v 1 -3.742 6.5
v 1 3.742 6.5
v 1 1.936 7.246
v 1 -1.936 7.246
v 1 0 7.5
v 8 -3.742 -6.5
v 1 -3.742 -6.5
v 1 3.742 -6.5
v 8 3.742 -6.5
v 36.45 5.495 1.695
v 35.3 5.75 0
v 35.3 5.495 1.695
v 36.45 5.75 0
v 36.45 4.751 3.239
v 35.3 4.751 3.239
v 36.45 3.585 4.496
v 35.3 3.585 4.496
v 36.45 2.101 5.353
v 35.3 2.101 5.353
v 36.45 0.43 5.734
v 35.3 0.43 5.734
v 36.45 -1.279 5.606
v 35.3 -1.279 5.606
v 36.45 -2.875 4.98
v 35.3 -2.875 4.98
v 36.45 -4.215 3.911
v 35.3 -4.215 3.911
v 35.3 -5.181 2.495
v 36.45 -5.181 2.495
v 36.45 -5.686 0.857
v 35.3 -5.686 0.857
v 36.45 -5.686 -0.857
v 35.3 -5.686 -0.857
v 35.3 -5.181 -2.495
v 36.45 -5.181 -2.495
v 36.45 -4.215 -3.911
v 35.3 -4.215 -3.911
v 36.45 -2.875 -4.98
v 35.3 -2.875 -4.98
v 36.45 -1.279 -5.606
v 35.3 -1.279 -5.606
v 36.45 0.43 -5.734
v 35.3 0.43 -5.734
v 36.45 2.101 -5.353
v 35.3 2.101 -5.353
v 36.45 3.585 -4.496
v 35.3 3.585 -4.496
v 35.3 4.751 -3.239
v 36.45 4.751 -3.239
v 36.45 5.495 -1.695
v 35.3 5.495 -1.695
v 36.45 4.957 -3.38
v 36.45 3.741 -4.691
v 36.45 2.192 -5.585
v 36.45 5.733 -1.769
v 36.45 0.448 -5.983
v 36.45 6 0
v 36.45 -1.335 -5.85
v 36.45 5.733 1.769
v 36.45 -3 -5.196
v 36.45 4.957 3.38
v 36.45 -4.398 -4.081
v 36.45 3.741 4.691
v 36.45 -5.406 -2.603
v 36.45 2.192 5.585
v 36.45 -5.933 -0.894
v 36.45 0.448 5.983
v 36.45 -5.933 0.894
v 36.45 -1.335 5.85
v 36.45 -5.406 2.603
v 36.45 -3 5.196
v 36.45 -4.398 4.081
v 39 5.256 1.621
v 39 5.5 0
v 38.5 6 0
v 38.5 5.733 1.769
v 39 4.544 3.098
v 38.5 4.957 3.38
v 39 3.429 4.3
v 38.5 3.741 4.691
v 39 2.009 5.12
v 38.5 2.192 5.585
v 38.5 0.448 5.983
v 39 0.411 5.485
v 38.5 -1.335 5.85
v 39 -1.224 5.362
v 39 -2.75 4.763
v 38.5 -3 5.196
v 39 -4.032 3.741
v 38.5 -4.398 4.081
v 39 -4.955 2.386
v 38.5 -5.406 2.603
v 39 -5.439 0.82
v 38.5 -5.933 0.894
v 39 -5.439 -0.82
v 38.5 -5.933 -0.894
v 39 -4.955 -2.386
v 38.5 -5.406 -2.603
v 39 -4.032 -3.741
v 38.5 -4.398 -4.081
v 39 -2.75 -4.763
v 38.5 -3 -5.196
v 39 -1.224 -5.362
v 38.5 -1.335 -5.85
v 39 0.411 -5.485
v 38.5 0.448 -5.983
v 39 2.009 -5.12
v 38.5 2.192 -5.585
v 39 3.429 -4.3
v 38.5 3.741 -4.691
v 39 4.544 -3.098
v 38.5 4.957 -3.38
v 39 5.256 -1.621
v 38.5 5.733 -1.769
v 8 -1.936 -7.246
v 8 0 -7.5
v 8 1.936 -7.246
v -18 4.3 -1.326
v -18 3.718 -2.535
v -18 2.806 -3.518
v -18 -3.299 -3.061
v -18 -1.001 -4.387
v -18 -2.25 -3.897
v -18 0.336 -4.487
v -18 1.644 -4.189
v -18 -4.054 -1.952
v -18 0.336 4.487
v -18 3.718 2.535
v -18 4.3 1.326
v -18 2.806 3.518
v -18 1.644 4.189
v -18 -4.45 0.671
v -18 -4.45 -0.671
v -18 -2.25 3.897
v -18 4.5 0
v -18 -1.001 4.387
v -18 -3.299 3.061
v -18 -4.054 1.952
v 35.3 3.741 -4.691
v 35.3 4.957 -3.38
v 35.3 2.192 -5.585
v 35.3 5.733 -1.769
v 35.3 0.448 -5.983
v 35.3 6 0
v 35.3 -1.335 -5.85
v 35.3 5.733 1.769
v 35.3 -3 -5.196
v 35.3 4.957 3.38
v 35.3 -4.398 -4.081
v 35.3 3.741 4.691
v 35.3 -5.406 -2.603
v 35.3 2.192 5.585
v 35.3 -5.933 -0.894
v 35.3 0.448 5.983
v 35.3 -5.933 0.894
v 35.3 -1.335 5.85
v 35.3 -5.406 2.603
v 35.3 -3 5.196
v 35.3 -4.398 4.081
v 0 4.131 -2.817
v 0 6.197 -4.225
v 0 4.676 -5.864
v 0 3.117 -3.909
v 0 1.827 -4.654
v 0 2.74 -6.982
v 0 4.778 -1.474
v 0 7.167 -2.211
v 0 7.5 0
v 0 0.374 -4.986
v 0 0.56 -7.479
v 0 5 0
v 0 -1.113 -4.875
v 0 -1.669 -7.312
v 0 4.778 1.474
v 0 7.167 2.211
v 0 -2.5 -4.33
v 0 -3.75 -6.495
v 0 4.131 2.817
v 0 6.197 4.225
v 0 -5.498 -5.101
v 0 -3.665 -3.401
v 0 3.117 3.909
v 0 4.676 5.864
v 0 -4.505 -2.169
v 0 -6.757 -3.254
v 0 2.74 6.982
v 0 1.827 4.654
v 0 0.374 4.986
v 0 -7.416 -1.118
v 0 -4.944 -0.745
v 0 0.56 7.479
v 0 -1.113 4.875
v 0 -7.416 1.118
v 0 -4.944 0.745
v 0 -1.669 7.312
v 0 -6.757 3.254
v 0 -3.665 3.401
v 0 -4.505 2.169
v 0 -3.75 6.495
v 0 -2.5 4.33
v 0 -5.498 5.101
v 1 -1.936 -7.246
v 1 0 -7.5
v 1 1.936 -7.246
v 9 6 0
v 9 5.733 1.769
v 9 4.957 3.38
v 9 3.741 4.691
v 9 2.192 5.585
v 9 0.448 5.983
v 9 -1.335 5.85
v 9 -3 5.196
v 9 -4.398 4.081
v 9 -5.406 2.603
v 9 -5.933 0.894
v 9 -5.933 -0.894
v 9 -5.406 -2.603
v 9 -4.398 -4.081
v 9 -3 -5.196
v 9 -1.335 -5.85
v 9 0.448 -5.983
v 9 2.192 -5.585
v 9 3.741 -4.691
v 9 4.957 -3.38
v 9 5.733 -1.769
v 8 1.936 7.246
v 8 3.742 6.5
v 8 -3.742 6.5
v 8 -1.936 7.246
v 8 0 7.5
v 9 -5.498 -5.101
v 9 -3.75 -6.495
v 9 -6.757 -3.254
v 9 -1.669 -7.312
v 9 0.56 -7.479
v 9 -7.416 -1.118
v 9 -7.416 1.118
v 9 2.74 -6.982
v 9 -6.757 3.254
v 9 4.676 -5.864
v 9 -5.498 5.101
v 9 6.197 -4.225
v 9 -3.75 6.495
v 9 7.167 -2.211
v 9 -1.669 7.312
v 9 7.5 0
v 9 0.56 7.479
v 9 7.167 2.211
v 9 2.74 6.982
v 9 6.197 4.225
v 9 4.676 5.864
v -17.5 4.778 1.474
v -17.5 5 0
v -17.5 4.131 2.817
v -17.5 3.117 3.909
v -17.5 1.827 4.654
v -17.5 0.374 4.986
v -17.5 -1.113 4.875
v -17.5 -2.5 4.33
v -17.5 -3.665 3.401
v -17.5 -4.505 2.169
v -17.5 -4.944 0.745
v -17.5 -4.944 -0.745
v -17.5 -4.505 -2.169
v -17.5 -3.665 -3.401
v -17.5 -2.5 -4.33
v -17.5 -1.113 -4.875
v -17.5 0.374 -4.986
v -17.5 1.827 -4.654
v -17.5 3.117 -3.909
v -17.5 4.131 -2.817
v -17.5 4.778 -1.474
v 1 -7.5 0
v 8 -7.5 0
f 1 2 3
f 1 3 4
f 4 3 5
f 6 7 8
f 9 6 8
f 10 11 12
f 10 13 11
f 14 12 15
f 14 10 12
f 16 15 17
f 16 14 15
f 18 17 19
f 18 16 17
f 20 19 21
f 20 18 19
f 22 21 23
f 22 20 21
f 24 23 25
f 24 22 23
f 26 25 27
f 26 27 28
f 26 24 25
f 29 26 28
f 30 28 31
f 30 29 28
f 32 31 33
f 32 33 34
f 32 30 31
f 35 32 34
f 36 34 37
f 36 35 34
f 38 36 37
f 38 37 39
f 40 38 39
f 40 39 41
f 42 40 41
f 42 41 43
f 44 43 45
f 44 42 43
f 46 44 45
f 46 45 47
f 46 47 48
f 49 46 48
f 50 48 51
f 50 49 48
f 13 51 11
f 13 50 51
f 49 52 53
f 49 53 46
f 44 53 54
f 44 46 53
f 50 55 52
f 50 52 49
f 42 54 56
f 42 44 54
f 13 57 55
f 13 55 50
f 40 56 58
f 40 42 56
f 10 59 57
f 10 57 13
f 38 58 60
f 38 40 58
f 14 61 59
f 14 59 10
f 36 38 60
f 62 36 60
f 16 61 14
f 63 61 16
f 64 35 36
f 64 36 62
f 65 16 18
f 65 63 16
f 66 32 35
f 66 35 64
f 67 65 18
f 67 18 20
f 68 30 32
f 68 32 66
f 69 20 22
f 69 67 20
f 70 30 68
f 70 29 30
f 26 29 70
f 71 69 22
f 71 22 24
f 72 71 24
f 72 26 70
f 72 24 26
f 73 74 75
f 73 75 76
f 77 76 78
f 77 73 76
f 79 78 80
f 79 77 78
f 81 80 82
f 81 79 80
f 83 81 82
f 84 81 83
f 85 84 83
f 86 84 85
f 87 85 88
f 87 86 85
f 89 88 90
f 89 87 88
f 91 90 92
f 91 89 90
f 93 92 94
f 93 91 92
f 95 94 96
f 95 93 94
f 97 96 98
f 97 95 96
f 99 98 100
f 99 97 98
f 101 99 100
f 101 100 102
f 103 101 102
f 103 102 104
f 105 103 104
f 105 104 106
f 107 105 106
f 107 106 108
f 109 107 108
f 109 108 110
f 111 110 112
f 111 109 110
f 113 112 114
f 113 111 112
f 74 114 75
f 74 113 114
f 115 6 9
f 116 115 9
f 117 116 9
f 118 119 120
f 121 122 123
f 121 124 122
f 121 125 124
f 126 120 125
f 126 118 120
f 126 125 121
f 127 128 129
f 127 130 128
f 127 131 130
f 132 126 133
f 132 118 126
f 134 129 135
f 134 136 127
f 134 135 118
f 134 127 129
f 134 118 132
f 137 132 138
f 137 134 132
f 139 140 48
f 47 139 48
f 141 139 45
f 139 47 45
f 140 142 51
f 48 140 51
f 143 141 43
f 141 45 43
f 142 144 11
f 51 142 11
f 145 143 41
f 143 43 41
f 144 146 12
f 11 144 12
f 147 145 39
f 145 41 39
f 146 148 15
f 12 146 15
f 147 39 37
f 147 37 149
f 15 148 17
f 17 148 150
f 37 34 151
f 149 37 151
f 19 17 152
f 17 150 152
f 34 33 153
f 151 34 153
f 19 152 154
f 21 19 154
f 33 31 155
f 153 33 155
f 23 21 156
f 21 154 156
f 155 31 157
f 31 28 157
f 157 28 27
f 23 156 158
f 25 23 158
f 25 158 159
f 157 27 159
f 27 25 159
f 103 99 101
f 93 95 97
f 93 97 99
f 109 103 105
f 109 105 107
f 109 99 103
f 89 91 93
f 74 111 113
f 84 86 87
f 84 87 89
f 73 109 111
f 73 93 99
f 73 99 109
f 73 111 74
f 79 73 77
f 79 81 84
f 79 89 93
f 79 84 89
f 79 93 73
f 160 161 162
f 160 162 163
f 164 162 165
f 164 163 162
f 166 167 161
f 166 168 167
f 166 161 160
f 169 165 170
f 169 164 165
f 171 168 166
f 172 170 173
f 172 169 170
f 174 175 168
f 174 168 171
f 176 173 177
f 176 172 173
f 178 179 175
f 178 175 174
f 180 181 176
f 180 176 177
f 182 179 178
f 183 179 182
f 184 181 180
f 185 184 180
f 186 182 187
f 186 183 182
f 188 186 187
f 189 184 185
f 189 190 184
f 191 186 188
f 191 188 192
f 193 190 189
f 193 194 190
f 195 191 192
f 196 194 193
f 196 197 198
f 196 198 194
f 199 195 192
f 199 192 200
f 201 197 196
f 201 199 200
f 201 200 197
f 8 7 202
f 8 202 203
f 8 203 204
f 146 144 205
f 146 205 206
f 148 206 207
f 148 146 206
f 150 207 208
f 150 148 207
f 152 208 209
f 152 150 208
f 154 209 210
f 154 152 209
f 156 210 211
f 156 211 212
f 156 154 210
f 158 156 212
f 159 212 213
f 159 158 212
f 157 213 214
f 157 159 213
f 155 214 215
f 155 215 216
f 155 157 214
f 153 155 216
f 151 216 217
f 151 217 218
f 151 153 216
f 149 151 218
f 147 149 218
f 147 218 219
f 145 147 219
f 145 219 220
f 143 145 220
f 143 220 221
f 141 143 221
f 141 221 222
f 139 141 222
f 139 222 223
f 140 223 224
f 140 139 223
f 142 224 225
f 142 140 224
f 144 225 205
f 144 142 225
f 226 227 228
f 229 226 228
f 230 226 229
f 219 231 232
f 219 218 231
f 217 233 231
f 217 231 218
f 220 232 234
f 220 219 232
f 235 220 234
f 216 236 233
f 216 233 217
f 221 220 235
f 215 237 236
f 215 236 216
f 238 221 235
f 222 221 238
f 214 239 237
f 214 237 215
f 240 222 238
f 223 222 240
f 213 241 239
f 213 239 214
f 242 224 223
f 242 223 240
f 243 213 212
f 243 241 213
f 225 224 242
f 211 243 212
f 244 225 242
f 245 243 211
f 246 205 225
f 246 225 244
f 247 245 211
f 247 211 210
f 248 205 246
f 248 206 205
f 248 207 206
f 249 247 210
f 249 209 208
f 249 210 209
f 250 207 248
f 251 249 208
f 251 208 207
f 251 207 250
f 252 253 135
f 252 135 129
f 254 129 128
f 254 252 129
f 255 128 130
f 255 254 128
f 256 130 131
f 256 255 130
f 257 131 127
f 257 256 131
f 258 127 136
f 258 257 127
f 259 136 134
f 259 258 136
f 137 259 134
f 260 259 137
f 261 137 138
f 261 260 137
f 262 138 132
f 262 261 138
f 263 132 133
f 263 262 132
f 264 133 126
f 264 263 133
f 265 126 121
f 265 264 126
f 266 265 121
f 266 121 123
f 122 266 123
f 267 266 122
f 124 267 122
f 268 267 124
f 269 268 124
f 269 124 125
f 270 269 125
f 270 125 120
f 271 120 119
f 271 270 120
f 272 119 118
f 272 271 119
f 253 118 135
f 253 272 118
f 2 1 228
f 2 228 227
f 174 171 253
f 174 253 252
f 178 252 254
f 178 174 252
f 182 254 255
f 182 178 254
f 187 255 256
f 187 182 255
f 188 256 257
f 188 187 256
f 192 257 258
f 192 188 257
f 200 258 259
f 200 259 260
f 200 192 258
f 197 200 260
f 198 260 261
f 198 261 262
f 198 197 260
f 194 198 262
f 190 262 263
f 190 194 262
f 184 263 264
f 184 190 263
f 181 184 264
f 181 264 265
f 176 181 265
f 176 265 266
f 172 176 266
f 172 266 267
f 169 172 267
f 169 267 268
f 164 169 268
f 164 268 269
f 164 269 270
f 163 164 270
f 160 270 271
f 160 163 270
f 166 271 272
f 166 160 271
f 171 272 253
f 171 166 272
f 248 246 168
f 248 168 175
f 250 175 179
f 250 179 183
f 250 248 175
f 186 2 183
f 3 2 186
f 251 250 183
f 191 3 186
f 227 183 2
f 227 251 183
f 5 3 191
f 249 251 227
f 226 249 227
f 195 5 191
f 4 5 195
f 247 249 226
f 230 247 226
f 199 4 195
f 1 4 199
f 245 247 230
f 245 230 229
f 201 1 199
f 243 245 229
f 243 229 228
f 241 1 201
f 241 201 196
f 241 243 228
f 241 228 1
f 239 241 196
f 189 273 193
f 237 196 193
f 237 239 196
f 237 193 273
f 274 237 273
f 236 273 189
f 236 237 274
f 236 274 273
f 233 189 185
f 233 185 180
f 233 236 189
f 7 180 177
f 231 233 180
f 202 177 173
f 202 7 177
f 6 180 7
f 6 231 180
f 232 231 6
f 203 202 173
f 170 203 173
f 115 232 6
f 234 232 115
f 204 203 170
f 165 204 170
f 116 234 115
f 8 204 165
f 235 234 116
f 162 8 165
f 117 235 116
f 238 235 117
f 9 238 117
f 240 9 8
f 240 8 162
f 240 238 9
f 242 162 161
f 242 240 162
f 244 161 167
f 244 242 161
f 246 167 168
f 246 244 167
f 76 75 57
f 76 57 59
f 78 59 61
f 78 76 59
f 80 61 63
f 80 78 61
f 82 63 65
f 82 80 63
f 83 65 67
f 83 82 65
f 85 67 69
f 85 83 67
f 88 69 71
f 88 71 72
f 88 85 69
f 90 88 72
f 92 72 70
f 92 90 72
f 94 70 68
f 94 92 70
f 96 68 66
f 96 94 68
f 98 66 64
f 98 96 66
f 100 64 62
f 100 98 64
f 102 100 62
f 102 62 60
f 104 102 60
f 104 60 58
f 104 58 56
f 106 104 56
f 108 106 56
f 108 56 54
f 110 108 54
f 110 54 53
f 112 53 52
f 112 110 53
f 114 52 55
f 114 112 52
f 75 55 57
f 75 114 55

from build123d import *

# Parameters (mm, degrees)
SKETCH3_W           = 1.15
SKETCH3_H           = 0.25
SKETCH2_OUTSIDE_W   = 29.164
SKETCH2_OUTSIDE_H   = 29.164
SKETCH2_OUTSIDE_W_2 = 13
SKETCH2_OUTSIDE_H_2 = 15
CUT_EXTRUDE1_DEPTH  = 7
CHAMFER1_SIZE       = 0.5


with BuildPart() as part:
    # Sketch1 → Revolve1 (revolve)
    with BuildSketch(Plane.XY):
        Polygon((-18, 0), (-18, 5), (0, 5), (0, 7.5), (9, 7.5), (9, 6), (39, 6), (39, 0), align=None)
    revolve(axis=Axis((-21.980615115, 0, 0), (1, 0, 0)))

    # Sketch3 → Cut-Revolve1 (revolve, cut)
    with BuildSketch(Plane.XY):
        with Locations((35.875, 5.875)):
            Rectangle(SKETCH3_W, SKETCH3_H)
    revolve(axis=Axis((-19.403846942, 0, 0), (1, 0, 0)), mode=Mode.SUBTRACT)

    # Sketch2 outside → Cut-Extrude1 (cut)
    with BuildSketch(Plane(origin=(1, 0, 0), x_dir=(0, 0, -1), z_dir=(1, 0, 0))):
        Rectangle(SKETCH2_OUTSIDE_W, SKETCH2_OUTSIDE_H)
        Rectangle(SKETCH2_OUTSIDE_W_2, SKETCH2_OUTSIDE_H_2, mode=Mode.SUBTRACT)
    extrude(amount=CUT_EXTRUDE1_DEPTH, mode=Mode.SUBTRACT)

    # Chamfer1
    chamfer1_edges = [part.edges().sort_by_distance(p)[0] for p in [
        (39, -6, 0),
        (-18, -5, 0),
    ]]
    chamfer(chamfer1_edges, length=CHAMFER1_SIZE)


solid = part.part
